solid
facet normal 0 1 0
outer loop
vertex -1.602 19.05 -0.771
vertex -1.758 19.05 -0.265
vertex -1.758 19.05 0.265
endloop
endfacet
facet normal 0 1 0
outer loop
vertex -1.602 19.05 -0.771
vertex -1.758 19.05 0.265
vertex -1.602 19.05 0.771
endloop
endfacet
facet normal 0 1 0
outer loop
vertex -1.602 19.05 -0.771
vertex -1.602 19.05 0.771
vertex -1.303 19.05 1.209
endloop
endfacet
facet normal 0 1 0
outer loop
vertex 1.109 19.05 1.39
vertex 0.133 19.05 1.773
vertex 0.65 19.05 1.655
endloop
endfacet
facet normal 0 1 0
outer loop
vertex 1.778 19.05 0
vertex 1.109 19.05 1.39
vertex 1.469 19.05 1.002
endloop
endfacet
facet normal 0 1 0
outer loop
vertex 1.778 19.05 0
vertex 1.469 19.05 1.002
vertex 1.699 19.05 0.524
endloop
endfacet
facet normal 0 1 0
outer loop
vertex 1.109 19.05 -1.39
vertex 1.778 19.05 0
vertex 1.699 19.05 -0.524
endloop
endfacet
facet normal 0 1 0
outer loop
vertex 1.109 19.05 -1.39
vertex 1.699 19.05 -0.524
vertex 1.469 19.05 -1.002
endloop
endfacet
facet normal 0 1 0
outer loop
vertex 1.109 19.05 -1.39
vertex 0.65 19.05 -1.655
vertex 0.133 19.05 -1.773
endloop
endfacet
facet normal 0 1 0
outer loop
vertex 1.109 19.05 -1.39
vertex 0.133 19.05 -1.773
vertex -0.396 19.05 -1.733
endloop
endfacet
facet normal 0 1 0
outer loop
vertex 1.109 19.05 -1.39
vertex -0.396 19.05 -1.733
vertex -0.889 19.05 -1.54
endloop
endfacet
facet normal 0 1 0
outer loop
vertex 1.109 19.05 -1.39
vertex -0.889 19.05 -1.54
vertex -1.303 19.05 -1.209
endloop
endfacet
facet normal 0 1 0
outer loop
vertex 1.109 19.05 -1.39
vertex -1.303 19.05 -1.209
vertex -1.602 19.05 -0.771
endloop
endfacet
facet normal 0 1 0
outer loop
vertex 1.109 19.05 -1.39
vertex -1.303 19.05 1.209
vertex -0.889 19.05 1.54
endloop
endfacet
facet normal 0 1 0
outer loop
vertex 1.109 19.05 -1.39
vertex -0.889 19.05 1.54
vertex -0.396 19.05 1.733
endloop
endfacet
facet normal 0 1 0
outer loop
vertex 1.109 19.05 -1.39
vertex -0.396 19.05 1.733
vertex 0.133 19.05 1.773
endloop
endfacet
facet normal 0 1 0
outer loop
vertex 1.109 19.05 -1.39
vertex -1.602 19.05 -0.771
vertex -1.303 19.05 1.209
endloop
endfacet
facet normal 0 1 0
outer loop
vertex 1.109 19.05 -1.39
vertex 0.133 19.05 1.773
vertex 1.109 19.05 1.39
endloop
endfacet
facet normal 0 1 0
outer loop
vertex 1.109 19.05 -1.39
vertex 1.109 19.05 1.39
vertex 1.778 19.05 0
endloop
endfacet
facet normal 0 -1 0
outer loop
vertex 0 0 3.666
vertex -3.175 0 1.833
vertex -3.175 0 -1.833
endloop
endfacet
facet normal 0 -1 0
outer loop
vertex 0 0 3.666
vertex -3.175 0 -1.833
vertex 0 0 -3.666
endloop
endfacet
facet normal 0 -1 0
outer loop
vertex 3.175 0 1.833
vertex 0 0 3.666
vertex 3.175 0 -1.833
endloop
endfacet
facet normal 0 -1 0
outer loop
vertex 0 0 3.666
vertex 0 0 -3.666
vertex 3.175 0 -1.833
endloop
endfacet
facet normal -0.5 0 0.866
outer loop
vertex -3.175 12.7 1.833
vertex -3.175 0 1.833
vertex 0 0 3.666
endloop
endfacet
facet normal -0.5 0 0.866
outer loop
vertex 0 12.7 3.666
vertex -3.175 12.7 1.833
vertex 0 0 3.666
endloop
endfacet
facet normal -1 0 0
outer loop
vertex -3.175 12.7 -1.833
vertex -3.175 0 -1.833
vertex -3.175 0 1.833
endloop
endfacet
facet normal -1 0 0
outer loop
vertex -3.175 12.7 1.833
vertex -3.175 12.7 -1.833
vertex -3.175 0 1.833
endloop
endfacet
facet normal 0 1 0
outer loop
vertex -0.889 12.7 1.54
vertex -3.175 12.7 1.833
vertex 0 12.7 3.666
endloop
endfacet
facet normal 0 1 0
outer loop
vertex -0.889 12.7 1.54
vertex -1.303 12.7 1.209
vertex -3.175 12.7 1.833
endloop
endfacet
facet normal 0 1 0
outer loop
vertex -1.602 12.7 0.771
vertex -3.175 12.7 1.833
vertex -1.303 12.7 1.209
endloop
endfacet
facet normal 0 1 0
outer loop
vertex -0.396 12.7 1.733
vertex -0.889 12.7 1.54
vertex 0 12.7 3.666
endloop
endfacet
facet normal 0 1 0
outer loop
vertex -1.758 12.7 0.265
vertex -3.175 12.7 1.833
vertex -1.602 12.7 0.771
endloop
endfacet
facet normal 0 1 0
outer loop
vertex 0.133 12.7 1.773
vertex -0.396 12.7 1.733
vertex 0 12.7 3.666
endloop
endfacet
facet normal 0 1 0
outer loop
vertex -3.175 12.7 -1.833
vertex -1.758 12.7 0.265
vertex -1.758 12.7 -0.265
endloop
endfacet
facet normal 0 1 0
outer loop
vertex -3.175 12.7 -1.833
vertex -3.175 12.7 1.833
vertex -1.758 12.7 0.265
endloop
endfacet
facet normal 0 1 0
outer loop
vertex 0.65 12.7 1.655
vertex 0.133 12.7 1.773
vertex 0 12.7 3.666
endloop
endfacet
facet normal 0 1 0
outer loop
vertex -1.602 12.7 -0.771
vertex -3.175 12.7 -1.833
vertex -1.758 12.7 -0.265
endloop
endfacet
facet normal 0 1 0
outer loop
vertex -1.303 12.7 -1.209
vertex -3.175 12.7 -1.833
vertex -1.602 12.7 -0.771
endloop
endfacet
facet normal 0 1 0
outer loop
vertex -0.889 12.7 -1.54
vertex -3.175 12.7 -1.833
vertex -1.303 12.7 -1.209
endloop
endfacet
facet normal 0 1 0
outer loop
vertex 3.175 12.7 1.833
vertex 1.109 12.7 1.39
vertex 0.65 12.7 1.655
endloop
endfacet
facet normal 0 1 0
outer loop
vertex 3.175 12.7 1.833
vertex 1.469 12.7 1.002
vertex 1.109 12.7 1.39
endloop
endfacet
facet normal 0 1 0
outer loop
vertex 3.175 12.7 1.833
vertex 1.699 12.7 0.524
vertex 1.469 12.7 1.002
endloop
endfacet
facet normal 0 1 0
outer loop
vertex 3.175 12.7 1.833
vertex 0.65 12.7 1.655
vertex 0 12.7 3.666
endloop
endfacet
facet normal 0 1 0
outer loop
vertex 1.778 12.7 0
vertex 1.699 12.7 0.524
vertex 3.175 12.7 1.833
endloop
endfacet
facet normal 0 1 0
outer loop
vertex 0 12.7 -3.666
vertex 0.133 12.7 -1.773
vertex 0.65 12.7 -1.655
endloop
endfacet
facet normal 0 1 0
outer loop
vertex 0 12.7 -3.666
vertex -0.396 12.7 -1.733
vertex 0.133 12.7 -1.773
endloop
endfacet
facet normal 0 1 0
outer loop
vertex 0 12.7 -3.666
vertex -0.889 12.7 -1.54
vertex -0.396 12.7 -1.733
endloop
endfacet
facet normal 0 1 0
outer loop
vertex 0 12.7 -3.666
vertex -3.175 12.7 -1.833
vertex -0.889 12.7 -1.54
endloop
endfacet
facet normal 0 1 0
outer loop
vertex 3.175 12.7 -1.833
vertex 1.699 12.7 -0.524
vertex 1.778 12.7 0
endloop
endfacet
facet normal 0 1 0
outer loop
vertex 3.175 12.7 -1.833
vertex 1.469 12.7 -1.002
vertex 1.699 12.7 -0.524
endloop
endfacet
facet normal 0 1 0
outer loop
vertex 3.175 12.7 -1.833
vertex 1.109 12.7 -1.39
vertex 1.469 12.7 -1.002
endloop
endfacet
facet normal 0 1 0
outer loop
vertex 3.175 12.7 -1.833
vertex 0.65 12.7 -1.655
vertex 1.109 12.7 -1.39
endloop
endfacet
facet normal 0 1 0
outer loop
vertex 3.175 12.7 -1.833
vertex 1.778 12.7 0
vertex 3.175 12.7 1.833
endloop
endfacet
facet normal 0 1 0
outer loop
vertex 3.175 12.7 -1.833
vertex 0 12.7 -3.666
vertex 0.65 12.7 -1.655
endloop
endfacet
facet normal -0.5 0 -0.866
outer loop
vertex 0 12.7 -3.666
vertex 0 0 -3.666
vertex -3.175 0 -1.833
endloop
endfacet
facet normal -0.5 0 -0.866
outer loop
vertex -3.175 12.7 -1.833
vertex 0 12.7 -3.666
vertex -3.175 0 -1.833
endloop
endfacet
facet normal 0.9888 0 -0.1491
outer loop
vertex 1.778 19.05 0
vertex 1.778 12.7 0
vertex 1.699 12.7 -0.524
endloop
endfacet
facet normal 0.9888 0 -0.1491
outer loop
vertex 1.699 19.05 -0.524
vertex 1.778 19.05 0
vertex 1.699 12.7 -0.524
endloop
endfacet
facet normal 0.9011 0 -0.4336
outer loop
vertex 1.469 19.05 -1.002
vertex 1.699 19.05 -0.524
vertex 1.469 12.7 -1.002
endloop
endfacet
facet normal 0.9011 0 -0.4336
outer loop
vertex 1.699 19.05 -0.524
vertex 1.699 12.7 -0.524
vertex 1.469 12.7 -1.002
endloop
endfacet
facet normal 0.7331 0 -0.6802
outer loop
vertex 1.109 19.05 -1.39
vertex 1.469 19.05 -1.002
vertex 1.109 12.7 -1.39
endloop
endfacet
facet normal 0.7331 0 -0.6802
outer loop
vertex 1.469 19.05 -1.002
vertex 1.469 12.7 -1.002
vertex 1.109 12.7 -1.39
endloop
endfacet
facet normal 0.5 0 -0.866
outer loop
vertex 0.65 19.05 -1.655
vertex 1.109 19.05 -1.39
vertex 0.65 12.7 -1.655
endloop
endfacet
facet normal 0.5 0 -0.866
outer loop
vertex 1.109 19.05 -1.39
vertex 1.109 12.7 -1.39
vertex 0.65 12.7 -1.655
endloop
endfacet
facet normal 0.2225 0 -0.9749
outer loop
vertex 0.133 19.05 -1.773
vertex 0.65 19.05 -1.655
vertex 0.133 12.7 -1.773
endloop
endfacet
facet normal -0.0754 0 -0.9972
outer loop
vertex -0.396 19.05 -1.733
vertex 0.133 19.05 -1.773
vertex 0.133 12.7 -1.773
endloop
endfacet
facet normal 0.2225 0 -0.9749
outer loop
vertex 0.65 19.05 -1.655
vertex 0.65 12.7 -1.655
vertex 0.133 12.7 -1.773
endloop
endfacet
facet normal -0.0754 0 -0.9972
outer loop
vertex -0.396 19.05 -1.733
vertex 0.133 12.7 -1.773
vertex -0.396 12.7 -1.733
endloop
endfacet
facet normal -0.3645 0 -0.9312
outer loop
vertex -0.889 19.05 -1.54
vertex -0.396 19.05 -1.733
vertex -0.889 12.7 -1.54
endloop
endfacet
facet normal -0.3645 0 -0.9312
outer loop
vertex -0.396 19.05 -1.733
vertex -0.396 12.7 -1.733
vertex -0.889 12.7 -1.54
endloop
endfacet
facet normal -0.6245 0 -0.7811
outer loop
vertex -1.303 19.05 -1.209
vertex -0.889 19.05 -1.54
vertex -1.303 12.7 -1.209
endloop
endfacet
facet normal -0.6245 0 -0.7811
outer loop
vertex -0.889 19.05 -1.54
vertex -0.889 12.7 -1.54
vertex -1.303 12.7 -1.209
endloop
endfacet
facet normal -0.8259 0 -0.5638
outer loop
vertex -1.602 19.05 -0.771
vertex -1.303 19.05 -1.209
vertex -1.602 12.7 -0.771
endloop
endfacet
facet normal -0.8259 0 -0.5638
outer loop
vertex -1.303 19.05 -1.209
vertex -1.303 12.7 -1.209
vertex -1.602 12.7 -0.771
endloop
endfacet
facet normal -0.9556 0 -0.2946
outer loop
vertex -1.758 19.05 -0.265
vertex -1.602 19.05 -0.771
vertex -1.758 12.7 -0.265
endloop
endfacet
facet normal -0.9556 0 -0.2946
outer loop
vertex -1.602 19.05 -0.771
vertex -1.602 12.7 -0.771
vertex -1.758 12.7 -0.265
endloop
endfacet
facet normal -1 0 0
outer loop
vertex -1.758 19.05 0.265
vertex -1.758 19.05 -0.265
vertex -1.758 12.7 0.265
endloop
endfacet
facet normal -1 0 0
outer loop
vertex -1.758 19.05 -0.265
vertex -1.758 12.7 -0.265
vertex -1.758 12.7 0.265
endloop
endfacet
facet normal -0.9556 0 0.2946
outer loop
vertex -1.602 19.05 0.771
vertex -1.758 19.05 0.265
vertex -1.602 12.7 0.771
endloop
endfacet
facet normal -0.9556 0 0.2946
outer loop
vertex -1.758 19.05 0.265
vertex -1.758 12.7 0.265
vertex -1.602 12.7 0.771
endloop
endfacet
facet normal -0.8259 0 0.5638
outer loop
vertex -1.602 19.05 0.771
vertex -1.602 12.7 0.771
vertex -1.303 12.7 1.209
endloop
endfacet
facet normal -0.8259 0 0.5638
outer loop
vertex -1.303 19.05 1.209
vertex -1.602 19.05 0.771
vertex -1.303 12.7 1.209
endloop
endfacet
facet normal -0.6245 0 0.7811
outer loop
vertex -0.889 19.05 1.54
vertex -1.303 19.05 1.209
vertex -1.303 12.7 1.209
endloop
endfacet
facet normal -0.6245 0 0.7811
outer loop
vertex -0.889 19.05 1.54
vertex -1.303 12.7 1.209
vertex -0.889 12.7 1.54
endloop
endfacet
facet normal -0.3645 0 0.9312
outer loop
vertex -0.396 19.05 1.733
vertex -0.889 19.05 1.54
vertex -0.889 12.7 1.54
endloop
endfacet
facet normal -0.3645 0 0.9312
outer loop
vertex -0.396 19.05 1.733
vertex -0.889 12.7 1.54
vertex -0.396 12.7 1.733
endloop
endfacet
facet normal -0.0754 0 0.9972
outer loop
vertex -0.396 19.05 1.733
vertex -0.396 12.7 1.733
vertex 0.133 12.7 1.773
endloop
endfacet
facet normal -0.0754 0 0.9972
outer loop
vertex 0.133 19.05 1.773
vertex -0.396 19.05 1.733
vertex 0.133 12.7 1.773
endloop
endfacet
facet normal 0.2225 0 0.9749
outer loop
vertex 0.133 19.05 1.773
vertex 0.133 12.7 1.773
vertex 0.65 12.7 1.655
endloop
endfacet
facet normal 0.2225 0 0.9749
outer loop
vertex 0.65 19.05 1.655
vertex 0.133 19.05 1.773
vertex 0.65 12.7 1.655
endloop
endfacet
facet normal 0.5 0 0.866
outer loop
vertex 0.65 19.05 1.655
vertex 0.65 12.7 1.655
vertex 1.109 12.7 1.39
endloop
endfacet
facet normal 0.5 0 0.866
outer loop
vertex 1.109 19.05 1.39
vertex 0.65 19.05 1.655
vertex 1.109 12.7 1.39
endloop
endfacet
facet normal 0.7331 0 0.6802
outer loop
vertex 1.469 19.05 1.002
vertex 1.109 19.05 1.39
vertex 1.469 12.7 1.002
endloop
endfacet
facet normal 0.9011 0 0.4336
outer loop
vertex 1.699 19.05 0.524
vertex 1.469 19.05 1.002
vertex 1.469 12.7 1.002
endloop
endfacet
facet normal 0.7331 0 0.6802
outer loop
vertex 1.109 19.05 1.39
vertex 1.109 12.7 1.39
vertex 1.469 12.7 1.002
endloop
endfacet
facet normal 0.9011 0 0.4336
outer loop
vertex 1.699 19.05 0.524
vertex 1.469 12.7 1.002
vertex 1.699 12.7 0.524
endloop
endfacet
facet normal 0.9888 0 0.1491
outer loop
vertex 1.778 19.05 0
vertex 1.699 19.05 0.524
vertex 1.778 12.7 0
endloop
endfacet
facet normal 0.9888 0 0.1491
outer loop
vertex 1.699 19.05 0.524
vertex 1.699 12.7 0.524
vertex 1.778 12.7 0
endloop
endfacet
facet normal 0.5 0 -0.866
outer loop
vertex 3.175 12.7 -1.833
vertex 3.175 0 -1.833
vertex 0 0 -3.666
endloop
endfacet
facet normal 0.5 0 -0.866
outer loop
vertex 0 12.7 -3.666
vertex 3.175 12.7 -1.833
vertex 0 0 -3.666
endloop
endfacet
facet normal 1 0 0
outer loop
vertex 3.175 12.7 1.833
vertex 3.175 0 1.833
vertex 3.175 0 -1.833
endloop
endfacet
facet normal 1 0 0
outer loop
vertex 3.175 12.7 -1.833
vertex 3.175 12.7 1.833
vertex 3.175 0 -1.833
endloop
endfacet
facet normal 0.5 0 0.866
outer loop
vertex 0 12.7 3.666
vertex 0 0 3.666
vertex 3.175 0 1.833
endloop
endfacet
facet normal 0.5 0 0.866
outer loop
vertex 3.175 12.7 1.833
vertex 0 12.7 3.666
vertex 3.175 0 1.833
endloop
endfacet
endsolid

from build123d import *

# Parameters (mm, degrees)
BOSS_EXTRUDE1_DEPTH = 12.7
SKETCH2_R           = 1.778
BOSS_EXTRUDE2_DEPTH = 6.35


with BuildPart() as part:
    # Sketch1 → Boss-Extrude1 (new body)
    with BuildSketch(Plane(origin=(0, 0, 0), x_dir=(1, 0, 0), z_dir=(0, 1, 0))):
        Polygon((0, 3.666174209), (-3.175, 1.833087105), (-3.175, -1.833087105), (0, -3.666174209), (3.175, -1.833087105), (3.175, 1.833087105), align=None)
    extrude(amount=BOSS_EXTRUDE1_DEPTH)

    # Sketch2 → Boss-Extrude2 (add)
    with BuildSketch(Plane(origin=(0, 12.7, 0), x_dir=(1, 0, 0), z_dir=(0, 1, 0))):
        Circle(SKETCH2_R)
    extrude(amount=BOSS_EXTRUDE2_DEPTH)


solid = part.part
